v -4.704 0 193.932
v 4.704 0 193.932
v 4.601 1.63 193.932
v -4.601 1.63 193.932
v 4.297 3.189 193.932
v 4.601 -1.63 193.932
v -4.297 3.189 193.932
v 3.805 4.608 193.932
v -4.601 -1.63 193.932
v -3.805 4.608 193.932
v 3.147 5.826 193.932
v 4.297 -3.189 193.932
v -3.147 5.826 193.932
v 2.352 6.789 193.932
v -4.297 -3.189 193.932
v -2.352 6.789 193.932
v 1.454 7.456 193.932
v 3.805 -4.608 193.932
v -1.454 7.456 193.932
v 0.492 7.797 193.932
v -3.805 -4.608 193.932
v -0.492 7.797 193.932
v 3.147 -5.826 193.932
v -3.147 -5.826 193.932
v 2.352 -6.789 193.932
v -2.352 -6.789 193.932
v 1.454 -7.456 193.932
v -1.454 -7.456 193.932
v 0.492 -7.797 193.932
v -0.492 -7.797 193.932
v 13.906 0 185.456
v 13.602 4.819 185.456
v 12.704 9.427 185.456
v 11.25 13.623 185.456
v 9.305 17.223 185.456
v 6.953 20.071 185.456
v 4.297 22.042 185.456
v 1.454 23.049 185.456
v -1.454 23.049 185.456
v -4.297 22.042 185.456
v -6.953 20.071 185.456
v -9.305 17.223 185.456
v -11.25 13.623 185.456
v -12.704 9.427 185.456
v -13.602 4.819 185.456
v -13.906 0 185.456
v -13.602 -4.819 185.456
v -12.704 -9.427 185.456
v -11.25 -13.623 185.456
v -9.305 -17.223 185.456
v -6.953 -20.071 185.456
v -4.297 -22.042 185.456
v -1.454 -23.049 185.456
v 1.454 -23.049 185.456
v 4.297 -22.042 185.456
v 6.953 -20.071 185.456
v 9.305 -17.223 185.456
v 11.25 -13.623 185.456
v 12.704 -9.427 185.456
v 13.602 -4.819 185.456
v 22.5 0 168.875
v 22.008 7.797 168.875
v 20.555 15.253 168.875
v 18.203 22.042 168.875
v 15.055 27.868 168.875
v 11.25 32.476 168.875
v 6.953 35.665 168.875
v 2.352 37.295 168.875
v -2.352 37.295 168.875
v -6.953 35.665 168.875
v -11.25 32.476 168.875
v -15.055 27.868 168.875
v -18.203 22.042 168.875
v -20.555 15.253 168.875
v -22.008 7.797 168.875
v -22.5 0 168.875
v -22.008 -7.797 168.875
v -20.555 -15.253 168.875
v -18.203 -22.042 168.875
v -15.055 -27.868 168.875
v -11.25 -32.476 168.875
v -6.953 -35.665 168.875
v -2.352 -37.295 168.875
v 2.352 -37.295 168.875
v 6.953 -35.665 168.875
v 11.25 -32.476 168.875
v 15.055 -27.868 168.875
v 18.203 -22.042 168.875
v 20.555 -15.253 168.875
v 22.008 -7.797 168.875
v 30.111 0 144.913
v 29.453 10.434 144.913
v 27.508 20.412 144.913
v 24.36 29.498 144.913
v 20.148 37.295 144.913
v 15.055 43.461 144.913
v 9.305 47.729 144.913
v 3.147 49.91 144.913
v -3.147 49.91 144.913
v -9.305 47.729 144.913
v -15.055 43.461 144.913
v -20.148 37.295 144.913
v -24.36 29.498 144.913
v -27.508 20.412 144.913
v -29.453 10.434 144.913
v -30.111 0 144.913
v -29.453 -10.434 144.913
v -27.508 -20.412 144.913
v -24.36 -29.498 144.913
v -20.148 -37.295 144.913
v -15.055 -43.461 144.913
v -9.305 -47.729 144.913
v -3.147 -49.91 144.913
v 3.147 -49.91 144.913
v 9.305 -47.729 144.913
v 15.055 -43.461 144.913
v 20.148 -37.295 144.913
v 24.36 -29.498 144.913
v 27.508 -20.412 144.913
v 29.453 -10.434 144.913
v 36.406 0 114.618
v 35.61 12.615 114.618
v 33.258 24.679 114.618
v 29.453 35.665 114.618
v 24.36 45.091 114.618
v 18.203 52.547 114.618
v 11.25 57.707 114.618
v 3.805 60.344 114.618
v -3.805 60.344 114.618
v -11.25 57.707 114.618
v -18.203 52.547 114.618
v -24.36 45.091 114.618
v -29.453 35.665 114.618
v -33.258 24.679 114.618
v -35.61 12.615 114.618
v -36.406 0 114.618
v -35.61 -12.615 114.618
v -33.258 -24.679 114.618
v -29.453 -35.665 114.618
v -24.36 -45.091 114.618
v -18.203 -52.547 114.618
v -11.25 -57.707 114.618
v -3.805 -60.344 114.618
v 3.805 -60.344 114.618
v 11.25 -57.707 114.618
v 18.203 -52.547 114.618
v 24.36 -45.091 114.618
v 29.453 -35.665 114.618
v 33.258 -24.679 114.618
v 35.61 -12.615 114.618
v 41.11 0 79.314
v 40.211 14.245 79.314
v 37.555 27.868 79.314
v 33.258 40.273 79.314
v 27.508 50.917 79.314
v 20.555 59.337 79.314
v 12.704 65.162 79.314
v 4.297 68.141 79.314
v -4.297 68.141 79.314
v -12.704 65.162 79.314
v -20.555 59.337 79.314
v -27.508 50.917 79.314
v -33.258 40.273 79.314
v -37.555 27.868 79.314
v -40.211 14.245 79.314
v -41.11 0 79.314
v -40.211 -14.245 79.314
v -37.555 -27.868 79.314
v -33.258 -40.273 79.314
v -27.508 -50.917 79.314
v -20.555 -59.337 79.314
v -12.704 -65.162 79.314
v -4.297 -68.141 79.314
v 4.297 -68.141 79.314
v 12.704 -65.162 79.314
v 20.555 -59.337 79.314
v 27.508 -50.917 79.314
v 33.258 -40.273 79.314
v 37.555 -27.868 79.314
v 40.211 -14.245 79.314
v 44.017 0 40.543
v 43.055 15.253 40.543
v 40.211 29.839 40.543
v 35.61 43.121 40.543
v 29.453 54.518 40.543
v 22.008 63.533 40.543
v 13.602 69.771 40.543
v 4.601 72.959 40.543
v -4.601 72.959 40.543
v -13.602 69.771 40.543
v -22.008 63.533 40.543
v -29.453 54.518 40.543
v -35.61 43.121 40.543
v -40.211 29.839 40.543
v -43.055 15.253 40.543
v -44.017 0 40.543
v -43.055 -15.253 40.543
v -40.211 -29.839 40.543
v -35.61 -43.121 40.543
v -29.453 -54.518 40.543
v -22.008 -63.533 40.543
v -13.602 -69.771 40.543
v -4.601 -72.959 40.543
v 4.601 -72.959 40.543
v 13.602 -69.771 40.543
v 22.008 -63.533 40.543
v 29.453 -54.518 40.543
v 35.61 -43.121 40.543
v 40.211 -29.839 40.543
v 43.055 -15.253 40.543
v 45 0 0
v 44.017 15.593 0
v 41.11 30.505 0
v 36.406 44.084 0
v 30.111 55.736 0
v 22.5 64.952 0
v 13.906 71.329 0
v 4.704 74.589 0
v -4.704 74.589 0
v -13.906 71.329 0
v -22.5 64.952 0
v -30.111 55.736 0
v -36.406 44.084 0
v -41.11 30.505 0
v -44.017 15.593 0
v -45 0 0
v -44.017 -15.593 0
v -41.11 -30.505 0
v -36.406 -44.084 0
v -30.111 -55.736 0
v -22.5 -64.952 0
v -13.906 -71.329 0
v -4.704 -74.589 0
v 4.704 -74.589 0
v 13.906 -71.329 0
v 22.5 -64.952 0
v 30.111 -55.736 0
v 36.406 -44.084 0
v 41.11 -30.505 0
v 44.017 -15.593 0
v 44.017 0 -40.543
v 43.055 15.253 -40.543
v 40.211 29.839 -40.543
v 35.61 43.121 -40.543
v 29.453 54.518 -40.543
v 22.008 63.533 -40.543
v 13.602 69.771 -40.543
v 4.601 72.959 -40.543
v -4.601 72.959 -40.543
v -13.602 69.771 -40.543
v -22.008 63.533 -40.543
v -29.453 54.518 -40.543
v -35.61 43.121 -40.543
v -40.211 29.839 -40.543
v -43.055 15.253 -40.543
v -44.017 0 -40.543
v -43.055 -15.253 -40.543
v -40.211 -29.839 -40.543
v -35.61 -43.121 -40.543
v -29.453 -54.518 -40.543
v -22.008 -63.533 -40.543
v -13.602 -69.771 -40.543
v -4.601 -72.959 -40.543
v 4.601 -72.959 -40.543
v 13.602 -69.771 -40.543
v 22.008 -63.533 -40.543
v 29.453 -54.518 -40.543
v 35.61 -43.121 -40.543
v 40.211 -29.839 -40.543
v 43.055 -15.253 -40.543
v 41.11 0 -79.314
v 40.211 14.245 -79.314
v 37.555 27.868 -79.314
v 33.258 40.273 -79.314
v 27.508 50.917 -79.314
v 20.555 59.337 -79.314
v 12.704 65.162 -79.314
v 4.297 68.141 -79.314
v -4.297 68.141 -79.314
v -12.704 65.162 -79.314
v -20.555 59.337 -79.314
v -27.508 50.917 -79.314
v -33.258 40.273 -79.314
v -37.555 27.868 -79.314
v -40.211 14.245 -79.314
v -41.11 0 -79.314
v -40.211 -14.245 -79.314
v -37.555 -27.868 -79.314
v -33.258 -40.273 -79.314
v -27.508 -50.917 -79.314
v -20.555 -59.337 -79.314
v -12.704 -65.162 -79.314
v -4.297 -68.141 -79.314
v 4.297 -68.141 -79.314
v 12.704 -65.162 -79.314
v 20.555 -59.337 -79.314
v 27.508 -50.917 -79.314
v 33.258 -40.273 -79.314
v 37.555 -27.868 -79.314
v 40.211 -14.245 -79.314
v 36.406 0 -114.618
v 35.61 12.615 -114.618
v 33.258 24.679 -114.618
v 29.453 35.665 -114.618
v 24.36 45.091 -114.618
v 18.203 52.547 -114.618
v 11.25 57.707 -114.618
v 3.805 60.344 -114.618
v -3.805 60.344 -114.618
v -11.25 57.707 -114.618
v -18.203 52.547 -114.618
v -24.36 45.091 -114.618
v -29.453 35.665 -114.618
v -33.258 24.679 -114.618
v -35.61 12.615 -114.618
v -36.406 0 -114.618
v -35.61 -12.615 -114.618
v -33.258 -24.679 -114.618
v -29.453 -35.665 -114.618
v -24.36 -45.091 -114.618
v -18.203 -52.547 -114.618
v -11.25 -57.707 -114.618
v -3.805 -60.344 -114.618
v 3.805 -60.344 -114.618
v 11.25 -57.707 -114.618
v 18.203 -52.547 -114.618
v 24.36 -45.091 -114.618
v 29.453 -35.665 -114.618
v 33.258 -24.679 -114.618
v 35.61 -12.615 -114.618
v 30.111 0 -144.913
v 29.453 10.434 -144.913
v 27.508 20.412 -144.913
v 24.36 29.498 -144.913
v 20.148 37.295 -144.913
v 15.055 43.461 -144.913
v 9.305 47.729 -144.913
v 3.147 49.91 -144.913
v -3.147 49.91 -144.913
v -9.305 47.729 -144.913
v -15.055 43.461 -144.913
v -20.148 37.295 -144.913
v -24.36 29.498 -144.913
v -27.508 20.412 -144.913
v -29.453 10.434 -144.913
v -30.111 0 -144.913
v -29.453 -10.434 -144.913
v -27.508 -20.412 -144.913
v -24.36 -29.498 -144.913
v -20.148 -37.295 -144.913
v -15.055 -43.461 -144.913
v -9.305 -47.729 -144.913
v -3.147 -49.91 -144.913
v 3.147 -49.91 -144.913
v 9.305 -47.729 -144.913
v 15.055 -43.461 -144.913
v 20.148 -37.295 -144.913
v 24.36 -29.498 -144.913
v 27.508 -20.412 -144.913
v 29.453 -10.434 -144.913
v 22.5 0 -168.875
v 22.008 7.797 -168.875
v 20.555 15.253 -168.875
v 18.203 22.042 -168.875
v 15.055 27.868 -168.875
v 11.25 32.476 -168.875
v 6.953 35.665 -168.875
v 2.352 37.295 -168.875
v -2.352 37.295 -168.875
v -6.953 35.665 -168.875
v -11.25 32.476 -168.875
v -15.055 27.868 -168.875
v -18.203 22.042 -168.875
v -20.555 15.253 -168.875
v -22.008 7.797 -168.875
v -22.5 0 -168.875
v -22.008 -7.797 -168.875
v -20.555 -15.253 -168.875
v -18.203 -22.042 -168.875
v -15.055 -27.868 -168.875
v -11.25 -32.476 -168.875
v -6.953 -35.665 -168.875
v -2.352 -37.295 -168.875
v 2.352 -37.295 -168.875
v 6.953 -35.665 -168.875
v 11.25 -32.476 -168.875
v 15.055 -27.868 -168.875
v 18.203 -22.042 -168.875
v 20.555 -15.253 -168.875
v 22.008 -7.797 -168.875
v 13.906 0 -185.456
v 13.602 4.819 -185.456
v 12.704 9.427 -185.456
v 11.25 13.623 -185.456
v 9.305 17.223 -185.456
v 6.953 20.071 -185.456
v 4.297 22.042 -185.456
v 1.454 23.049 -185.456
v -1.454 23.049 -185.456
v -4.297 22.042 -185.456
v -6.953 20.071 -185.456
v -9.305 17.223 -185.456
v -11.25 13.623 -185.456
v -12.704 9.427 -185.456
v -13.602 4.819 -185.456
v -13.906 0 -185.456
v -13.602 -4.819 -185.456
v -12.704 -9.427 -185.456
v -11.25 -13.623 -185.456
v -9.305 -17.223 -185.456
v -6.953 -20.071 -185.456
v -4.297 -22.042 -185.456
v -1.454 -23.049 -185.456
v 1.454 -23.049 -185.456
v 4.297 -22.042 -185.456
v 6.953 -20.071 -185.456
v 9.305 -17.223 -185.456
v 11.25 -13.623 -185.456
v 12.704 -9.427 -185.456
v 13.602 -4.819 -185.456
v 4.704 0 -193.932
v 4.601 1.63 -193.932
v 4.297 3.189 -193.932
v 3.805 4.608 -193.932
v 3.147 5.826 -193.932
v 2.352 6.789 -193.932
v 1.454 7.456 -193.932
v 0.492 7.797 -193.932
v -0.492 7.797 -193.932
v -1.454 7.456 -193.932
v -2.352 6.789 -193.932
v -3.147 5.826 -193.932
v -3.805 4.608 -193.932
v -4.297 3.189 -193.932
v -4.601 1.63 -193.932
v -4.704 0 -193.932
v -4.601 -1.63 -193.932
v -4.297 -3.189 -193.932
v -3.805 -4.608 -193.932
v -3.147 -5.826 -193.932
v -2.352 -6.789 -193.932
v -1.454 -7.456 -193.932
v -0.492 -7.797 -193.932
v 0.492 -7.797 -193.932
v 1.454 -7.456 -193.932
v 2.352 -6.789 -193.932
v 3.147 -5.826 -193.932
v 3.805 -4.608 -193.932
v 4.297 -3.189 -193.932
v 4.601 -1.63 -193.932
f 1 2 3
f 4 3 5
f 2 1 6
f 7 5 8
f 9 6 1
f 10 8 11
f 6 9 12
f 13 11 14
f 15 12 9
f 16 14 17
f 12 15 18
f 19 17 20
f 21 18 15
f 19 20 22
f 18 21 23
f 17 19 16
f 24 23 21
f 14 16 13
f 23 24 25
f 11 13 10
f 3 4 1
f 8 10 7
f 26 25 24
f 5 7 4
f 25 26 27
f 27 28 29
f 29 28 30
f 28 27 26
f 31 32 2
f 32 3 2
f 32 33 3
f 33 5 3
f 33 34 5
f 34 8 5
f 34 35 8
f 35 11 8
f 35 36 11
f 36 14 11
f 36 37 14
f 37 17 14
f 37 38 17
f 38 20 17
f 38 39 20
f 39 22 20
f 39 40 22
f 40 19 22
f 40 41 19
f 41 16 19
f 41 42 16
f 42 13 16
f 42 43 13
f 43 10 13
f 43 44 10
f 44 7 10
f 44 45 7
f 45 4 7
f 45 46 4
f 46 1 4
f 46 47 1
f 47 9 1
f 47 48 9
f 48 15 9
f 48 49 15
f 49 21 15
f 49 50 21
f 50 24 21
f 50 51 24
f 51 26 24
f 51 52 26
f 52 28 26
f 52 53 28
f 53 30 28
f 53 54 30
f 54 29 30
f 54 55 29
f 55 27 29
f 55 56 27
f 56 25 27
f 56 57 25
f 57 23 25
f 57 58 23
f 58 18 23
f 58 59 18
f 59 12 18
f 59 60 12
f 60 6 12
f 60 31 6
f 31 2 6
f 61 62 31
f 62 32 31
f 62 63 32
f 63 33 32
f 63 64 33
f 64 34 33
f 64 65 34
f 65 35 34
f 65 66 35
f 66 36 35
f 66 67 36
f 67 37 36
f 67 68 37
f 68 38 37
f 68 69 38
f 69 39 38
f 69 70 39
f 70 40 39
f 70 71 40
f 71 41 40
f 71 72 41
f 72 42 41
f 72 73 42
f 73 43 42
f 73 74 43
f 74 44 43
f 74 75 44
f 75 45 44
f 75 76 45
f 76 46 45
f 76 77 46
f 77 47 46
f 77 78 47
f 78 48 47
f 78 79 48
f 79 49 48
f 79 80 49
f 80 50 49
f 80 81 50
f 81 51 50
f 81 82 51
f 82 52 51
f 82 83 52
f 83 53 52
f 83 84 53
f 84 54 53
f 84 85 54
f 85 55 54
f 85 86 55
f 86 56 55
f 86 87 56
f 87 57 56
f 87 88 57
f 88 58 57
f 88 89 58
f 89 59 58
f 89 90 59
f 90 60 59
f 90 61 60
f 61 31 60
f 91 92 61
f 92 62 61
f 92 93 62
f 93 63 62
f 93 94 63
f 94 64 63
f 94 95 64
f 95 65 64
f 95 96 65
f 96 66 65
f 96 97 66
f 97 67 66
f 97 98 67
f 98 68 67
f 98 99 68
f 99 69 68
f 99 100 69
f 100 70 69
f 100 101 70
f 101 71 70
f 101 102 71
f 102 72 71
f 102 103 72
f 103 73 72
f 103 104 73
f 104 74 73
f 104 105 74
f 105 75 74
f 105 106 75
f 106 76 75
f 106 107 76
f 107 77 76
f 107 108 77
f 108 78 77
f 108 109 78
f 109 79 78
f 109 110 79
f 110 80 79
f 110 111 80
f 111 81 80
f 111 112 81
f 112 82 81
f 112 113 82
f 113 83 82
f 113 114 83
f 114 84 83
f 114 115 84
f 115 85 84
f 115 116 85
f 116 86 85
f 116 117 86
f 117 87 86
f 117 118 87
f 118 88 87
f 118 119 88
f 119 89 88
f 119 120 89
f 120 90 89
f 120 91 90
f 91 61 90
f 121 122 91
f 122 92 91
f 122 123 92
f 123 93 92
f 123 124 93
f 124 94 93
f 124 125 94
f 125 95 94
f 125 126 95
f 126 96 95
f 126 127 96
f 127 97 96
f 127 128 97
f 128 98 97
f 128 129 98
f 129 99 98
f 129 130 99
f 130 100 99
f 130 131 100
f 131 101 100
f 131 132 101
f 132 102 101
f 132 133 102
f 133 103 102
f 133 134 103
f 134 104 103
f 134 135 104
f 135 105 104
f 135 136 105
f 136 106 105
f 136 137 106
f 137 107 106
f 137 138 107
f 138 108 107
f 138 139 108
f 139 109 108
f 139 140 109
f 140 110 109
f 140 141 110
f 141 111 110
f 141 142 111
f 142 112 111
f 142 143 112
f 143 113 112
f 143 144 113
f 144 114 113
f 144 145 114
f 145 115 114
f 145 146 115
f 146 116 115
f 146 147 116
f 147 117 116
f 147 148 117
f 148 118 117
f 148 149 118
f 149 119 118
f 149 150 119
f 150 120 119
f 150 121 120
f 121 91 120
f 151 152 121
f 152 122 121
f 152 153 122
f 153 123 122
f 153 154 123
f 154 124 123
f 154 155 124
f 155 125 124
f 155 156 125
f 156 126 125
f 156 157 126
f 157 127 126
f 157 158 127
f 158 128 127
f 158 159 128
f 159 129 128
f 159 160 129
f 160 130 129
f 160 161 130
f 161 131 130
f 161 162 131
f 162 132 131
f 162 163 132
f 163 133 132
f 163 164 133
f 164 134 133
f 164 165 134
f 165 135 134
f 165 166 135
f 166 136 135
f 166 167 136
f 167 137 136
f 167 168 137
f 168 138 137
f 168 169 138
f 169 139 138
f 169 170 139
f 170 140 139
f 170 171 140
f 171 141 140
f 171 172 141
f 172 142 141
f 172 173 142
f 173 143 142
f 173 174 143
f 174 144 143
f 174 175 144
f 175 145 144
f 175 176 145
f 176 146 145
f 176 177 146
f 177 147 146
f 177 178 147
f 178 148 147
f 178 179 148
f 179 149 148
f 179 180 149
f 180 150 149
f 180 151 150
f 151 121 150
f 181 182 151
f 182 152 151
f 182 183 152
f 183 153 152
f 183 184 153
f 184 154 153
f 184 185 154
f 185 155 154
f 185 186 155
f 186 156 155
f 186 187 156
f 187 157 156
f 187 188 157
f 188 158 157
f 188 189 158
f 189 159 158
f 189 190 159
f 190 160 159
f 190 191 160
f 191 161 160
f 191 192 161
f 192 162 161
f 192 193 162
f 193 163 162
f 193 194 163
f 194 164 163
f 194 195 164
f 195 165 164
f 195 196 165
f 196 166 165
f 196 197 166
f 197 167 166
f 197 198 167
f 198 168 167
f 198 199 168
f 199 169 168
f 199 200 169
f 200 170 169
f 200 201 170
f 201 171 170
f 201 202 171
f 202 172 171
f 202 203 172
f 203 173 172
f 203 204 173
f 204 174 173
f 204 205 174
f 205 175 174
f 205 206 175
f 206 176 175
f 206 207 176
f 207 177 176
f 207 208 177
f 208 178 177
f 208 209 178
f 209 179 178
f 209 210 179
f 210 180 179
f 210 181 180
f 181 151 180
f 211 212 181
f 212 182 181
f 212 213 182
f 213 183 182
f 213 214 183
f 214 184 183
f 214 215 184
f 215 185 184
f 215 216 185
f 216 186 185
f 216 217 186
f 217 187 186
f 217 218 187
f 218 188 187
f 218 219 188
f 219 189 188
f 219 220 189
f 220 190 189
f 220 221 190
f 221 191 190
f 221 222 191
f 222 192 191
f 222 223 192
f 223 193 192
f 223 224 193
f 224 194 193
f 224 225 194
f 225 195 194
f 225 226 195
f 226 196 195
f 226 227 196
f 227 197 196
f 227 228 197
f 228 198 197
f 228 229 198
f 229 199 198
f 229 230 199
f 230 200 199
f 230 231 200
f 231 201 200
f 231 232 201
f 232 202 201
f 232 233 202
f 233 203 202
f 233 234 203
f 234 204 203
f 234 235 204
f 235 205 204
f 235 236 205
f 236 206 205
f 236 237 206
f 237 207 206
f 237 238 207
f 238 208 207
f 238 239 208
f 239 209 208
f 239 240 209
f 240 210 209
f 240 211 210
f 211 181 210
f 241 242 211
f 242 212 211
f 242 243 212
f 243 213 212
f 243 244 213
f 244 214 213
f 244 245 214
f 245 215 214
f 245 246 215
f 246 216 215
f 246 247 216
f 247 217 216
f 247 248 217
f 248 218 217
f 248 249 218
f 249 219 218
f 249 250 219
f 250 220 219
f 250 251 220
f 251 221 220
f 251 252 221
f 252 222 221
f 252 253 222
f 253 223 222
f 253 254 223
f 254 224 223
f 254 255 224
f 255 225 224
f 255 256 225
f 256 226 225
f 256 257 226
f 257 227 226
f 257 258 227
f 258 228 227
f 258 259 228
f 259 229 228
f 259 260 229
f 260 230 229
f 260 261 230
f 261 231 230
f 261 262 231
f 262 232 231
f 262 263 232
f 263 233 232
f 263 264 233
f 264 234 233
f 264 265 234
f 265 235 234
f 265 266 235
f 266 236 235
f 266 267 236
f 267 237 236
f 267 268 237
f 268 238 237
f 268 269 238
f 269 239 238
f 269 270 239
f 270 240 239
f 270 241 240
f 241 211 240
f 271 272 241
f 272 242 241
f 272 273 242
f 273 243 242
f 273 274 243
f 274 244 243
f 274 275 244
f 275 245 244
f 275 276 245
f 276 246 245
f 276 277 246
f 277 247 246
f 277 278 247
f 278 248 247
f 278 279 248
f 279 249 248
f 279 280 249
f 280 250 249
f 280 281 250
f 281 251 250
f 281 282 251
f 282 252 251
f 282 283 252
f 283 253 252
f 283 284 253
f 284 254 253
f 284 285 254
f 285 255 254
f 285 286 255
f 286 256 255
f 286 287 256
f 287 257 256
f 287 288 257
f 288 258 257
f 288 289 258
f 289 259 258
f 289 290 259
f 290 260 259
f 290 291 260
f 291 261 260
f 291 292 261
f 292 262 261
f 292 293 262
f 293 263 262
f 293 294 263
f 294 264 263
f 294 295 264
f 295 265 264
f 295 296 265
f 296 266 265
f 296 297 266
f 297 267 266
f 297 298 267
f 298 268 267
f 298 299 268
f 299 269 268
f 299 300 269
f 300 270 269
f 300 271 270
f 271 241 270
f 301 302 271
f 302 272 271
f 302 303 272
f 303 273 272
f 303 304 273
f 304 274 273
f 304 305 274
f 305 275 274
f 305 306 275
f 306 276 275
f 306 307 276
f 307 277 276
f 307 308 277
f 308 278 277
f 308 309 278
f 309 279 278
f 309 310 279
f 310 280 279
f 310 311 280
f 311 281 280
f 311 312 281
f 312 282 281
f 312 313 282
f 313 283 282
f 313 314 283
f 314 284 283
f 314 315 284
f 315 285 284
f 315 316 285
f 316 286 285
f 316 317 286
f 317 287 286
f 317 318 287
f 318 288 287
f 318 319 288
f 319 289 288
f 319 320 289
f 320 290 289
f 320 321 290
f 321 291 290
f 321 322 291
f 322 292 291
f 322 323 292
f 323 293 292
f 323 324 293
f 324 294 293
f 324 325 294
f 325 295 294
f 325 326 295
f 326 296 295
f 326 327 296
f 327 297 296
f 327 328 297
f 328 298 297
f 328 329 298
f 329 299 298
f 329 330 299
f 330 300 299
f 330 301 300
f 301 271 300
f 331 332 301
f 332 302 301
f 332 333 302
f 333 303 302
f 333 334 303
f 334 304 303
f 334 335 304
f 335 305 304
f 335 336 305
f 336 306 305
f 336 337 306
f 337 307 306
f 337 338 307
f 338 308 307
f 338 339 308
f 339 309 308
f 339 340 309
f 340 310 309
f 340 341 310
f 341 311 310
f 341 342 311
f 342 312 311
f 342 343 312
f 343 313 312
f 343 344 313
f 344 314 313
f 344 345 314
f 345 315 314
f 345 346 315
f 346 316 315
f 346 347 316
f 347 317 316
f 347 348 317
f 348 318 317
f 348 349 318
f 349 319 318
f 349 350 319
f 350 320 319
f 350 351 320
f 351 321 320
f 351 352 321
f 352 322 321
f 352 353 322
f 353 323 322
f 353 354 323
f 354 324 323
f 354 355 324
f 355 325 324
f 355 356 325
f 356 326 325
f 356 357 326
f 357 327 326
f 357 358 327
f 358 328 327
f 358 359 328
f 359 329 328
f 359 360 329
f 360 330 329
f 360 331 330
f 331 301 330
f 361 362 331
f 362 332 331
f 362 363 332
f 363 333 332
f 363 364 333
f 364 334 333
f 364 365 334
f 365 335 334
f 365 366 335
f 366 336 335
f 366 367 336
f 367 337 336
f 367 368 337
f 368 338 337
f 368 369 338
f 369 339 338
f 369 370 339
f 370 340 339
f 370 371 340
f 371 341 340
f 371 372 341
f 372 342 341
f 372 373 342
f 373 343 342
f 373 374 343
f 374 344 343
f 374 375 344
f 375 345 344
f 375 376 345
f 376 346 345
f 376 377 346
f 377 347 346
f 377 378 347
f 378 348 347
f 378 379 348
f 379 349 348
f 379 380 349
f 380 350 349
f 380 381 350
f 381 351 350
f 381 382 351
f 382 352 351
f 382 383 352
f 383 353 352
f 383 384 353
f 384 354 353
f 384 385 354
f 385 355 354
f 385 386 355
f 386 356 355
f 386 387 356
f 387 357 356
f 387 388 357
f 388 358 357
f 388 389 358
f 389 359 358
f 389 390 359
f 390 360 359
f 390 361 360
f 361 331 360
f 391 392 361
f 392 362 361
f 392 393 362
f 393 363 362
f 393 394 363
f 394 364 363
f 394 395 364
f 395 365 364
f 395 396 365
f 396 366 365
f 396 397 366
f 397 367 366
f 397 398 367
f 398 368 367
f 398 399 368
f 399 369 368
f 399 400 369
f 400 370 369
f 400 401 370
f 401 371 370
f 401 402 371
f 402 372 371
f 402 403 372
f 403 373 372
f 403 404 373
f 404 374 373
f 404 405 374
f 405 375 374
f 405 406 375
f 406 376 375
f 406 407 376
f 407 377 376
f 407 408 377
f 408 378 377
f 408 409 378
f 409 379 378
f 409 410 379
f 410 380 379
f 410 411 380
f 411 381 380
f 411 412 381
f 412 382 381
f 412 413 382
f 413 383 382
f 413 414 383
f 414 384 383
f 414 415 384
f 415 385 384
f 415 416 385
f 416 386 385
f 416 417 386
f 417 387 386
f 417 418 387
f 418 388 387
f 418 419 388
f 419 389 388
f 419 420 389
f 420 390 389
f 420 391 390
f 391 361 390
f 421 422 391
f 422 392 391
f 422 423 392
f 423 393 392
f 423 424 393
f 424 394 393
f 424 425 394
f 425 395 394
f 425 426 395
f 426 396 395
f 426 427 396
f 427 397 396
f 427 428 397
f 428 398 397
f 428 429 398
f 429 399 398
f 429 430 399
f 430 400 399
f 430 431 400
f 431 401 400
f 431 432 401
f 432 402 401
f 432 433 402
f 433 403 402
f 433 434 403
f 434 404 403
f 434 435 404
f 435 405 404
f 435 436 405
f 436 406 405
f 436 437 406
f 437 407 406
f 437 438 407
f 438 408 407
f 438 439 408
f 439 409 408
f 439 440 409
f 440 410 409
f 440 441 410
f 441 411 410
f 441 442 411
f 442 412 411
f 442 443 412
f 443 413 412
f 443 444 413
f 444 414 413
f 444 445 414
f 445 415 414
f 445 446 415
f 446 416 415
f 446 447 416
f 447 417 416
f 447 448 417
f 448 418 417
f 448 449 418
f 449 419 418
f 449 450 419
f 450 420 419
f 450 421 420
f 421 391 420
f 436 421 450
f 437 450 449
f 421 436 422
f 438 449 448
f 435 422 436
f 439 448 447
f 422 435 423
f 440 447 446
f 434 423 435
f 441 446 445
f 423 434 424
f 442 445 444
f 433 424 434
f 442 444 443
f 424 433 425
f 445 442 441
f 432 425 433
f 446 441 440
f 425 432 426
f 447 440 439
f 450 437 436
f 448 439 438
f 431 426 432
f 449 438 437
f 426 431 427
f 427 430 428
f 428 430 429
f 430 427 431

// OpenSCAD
// Generated by SolidPython 1.0.1 on 2020-07-29 00:46:45


scale(v = [3, 5, 13]) {
	sphere(r = 15);
}
/***********************************************
*********      SolidPython code:      **********
************************************************
 
# import packages: SolidPython
from solid import *
from solid.utils import *
from itertools import chain, combinations, permutations


class Resize:

    def __init__(self, scad_file):
        self.scad_file = scad_file
        #self.scad_file = import_scad(scad_file)
        # cone/cylinder param:
        self.r1 = 0
        self.r2 = 0
        self.h = 0
        # rectangular prism param:
        self.w = 0
        self.l = 0
        # ellipse param:
        self.r = 0

    # import OpenScad code (file name corresponds to shape)


    # classify shape + parameters
    def assign(self, param1, param2, param3):
        if self.scad_file == 'cone.scad':
            self.r1 = param1
            self.r2 = param2
            self.h = param3
        elif self.scad_file == 'cylinder.scad':
            self.r1 = param1
            self.r2 = param2
            self.h = param3
        elif self.scad_file == 'rectangularPrism.scad':
            self.h = param1
            self.l = param2
            self.w = param3
        else:
            self.r = param1
            self.h = param2

    # resize parameters
    def iterate(self):
        x = range(3, 20, 2)
        i = 1
        if self.scad_file == 'cone.scad':
            tempList = list(permutations(x, 2))
            for temp in tempList:
                param1 = temp[0]
                param2 = temp[1]
                filepath = 'produced_scad_files/' + 'cone' + str(param1) + '_' + str(param2) + '_' + '.scad'
                scad_render_to_file(cylinder(h=param1, r1=param2, r2=0), filepath)

        elif self.scad_file == 'cylinder.scad':
            tempList = list(permutations(x, 3))
            for temp in tempList:
                param1 = temp[0]
                param2 = temp[1]
                filepath = 'produced_scad_files/' + 'cylinder' + str(param1) + '_' + str(param2) + '_' + '.scad'
                scad_render_to_file(cylinder(h=param1, r1=param2, r2=param2), filepath)

        elif self.scad_file == 'rectangularPrism.scad':
            tempList = list(permutations(x, 3))
            for temp in tempList:
                param1 = temp[0]
                param2 = temp[1]
                param3 = temp[2]
                filepath = 'produced_scad_files/' + 'rectangularPrism' + str(param1) + '_' + str(param2) + '_' + str(
                    param3) + '.scad'
                scad_render_to_file(cube(size=(param1, param2, param3)), filepath)

        elif self.scad_file == 'ellipse.scad':
            tempList = list(permutations(x, 4))
            for temp in tempList:
                param1 = temp[0]
                param2 = temp[1]
                param3 = temp[2]
                param4 = temp[3]
                filepath = 'produced_scad_files/' + 'ellipse' + str(param1) + '_' + str(param2) + '_' + str(param3) + '_' + str(param4) + '.scad'
                scad_render_to_file(scale([param1, param2, param3])(sphere(r=param4)), filepath)

    def render_to_scadfile(self):
        scad_render_to_file(scad, 'example.scad') 
 
************************************************/
